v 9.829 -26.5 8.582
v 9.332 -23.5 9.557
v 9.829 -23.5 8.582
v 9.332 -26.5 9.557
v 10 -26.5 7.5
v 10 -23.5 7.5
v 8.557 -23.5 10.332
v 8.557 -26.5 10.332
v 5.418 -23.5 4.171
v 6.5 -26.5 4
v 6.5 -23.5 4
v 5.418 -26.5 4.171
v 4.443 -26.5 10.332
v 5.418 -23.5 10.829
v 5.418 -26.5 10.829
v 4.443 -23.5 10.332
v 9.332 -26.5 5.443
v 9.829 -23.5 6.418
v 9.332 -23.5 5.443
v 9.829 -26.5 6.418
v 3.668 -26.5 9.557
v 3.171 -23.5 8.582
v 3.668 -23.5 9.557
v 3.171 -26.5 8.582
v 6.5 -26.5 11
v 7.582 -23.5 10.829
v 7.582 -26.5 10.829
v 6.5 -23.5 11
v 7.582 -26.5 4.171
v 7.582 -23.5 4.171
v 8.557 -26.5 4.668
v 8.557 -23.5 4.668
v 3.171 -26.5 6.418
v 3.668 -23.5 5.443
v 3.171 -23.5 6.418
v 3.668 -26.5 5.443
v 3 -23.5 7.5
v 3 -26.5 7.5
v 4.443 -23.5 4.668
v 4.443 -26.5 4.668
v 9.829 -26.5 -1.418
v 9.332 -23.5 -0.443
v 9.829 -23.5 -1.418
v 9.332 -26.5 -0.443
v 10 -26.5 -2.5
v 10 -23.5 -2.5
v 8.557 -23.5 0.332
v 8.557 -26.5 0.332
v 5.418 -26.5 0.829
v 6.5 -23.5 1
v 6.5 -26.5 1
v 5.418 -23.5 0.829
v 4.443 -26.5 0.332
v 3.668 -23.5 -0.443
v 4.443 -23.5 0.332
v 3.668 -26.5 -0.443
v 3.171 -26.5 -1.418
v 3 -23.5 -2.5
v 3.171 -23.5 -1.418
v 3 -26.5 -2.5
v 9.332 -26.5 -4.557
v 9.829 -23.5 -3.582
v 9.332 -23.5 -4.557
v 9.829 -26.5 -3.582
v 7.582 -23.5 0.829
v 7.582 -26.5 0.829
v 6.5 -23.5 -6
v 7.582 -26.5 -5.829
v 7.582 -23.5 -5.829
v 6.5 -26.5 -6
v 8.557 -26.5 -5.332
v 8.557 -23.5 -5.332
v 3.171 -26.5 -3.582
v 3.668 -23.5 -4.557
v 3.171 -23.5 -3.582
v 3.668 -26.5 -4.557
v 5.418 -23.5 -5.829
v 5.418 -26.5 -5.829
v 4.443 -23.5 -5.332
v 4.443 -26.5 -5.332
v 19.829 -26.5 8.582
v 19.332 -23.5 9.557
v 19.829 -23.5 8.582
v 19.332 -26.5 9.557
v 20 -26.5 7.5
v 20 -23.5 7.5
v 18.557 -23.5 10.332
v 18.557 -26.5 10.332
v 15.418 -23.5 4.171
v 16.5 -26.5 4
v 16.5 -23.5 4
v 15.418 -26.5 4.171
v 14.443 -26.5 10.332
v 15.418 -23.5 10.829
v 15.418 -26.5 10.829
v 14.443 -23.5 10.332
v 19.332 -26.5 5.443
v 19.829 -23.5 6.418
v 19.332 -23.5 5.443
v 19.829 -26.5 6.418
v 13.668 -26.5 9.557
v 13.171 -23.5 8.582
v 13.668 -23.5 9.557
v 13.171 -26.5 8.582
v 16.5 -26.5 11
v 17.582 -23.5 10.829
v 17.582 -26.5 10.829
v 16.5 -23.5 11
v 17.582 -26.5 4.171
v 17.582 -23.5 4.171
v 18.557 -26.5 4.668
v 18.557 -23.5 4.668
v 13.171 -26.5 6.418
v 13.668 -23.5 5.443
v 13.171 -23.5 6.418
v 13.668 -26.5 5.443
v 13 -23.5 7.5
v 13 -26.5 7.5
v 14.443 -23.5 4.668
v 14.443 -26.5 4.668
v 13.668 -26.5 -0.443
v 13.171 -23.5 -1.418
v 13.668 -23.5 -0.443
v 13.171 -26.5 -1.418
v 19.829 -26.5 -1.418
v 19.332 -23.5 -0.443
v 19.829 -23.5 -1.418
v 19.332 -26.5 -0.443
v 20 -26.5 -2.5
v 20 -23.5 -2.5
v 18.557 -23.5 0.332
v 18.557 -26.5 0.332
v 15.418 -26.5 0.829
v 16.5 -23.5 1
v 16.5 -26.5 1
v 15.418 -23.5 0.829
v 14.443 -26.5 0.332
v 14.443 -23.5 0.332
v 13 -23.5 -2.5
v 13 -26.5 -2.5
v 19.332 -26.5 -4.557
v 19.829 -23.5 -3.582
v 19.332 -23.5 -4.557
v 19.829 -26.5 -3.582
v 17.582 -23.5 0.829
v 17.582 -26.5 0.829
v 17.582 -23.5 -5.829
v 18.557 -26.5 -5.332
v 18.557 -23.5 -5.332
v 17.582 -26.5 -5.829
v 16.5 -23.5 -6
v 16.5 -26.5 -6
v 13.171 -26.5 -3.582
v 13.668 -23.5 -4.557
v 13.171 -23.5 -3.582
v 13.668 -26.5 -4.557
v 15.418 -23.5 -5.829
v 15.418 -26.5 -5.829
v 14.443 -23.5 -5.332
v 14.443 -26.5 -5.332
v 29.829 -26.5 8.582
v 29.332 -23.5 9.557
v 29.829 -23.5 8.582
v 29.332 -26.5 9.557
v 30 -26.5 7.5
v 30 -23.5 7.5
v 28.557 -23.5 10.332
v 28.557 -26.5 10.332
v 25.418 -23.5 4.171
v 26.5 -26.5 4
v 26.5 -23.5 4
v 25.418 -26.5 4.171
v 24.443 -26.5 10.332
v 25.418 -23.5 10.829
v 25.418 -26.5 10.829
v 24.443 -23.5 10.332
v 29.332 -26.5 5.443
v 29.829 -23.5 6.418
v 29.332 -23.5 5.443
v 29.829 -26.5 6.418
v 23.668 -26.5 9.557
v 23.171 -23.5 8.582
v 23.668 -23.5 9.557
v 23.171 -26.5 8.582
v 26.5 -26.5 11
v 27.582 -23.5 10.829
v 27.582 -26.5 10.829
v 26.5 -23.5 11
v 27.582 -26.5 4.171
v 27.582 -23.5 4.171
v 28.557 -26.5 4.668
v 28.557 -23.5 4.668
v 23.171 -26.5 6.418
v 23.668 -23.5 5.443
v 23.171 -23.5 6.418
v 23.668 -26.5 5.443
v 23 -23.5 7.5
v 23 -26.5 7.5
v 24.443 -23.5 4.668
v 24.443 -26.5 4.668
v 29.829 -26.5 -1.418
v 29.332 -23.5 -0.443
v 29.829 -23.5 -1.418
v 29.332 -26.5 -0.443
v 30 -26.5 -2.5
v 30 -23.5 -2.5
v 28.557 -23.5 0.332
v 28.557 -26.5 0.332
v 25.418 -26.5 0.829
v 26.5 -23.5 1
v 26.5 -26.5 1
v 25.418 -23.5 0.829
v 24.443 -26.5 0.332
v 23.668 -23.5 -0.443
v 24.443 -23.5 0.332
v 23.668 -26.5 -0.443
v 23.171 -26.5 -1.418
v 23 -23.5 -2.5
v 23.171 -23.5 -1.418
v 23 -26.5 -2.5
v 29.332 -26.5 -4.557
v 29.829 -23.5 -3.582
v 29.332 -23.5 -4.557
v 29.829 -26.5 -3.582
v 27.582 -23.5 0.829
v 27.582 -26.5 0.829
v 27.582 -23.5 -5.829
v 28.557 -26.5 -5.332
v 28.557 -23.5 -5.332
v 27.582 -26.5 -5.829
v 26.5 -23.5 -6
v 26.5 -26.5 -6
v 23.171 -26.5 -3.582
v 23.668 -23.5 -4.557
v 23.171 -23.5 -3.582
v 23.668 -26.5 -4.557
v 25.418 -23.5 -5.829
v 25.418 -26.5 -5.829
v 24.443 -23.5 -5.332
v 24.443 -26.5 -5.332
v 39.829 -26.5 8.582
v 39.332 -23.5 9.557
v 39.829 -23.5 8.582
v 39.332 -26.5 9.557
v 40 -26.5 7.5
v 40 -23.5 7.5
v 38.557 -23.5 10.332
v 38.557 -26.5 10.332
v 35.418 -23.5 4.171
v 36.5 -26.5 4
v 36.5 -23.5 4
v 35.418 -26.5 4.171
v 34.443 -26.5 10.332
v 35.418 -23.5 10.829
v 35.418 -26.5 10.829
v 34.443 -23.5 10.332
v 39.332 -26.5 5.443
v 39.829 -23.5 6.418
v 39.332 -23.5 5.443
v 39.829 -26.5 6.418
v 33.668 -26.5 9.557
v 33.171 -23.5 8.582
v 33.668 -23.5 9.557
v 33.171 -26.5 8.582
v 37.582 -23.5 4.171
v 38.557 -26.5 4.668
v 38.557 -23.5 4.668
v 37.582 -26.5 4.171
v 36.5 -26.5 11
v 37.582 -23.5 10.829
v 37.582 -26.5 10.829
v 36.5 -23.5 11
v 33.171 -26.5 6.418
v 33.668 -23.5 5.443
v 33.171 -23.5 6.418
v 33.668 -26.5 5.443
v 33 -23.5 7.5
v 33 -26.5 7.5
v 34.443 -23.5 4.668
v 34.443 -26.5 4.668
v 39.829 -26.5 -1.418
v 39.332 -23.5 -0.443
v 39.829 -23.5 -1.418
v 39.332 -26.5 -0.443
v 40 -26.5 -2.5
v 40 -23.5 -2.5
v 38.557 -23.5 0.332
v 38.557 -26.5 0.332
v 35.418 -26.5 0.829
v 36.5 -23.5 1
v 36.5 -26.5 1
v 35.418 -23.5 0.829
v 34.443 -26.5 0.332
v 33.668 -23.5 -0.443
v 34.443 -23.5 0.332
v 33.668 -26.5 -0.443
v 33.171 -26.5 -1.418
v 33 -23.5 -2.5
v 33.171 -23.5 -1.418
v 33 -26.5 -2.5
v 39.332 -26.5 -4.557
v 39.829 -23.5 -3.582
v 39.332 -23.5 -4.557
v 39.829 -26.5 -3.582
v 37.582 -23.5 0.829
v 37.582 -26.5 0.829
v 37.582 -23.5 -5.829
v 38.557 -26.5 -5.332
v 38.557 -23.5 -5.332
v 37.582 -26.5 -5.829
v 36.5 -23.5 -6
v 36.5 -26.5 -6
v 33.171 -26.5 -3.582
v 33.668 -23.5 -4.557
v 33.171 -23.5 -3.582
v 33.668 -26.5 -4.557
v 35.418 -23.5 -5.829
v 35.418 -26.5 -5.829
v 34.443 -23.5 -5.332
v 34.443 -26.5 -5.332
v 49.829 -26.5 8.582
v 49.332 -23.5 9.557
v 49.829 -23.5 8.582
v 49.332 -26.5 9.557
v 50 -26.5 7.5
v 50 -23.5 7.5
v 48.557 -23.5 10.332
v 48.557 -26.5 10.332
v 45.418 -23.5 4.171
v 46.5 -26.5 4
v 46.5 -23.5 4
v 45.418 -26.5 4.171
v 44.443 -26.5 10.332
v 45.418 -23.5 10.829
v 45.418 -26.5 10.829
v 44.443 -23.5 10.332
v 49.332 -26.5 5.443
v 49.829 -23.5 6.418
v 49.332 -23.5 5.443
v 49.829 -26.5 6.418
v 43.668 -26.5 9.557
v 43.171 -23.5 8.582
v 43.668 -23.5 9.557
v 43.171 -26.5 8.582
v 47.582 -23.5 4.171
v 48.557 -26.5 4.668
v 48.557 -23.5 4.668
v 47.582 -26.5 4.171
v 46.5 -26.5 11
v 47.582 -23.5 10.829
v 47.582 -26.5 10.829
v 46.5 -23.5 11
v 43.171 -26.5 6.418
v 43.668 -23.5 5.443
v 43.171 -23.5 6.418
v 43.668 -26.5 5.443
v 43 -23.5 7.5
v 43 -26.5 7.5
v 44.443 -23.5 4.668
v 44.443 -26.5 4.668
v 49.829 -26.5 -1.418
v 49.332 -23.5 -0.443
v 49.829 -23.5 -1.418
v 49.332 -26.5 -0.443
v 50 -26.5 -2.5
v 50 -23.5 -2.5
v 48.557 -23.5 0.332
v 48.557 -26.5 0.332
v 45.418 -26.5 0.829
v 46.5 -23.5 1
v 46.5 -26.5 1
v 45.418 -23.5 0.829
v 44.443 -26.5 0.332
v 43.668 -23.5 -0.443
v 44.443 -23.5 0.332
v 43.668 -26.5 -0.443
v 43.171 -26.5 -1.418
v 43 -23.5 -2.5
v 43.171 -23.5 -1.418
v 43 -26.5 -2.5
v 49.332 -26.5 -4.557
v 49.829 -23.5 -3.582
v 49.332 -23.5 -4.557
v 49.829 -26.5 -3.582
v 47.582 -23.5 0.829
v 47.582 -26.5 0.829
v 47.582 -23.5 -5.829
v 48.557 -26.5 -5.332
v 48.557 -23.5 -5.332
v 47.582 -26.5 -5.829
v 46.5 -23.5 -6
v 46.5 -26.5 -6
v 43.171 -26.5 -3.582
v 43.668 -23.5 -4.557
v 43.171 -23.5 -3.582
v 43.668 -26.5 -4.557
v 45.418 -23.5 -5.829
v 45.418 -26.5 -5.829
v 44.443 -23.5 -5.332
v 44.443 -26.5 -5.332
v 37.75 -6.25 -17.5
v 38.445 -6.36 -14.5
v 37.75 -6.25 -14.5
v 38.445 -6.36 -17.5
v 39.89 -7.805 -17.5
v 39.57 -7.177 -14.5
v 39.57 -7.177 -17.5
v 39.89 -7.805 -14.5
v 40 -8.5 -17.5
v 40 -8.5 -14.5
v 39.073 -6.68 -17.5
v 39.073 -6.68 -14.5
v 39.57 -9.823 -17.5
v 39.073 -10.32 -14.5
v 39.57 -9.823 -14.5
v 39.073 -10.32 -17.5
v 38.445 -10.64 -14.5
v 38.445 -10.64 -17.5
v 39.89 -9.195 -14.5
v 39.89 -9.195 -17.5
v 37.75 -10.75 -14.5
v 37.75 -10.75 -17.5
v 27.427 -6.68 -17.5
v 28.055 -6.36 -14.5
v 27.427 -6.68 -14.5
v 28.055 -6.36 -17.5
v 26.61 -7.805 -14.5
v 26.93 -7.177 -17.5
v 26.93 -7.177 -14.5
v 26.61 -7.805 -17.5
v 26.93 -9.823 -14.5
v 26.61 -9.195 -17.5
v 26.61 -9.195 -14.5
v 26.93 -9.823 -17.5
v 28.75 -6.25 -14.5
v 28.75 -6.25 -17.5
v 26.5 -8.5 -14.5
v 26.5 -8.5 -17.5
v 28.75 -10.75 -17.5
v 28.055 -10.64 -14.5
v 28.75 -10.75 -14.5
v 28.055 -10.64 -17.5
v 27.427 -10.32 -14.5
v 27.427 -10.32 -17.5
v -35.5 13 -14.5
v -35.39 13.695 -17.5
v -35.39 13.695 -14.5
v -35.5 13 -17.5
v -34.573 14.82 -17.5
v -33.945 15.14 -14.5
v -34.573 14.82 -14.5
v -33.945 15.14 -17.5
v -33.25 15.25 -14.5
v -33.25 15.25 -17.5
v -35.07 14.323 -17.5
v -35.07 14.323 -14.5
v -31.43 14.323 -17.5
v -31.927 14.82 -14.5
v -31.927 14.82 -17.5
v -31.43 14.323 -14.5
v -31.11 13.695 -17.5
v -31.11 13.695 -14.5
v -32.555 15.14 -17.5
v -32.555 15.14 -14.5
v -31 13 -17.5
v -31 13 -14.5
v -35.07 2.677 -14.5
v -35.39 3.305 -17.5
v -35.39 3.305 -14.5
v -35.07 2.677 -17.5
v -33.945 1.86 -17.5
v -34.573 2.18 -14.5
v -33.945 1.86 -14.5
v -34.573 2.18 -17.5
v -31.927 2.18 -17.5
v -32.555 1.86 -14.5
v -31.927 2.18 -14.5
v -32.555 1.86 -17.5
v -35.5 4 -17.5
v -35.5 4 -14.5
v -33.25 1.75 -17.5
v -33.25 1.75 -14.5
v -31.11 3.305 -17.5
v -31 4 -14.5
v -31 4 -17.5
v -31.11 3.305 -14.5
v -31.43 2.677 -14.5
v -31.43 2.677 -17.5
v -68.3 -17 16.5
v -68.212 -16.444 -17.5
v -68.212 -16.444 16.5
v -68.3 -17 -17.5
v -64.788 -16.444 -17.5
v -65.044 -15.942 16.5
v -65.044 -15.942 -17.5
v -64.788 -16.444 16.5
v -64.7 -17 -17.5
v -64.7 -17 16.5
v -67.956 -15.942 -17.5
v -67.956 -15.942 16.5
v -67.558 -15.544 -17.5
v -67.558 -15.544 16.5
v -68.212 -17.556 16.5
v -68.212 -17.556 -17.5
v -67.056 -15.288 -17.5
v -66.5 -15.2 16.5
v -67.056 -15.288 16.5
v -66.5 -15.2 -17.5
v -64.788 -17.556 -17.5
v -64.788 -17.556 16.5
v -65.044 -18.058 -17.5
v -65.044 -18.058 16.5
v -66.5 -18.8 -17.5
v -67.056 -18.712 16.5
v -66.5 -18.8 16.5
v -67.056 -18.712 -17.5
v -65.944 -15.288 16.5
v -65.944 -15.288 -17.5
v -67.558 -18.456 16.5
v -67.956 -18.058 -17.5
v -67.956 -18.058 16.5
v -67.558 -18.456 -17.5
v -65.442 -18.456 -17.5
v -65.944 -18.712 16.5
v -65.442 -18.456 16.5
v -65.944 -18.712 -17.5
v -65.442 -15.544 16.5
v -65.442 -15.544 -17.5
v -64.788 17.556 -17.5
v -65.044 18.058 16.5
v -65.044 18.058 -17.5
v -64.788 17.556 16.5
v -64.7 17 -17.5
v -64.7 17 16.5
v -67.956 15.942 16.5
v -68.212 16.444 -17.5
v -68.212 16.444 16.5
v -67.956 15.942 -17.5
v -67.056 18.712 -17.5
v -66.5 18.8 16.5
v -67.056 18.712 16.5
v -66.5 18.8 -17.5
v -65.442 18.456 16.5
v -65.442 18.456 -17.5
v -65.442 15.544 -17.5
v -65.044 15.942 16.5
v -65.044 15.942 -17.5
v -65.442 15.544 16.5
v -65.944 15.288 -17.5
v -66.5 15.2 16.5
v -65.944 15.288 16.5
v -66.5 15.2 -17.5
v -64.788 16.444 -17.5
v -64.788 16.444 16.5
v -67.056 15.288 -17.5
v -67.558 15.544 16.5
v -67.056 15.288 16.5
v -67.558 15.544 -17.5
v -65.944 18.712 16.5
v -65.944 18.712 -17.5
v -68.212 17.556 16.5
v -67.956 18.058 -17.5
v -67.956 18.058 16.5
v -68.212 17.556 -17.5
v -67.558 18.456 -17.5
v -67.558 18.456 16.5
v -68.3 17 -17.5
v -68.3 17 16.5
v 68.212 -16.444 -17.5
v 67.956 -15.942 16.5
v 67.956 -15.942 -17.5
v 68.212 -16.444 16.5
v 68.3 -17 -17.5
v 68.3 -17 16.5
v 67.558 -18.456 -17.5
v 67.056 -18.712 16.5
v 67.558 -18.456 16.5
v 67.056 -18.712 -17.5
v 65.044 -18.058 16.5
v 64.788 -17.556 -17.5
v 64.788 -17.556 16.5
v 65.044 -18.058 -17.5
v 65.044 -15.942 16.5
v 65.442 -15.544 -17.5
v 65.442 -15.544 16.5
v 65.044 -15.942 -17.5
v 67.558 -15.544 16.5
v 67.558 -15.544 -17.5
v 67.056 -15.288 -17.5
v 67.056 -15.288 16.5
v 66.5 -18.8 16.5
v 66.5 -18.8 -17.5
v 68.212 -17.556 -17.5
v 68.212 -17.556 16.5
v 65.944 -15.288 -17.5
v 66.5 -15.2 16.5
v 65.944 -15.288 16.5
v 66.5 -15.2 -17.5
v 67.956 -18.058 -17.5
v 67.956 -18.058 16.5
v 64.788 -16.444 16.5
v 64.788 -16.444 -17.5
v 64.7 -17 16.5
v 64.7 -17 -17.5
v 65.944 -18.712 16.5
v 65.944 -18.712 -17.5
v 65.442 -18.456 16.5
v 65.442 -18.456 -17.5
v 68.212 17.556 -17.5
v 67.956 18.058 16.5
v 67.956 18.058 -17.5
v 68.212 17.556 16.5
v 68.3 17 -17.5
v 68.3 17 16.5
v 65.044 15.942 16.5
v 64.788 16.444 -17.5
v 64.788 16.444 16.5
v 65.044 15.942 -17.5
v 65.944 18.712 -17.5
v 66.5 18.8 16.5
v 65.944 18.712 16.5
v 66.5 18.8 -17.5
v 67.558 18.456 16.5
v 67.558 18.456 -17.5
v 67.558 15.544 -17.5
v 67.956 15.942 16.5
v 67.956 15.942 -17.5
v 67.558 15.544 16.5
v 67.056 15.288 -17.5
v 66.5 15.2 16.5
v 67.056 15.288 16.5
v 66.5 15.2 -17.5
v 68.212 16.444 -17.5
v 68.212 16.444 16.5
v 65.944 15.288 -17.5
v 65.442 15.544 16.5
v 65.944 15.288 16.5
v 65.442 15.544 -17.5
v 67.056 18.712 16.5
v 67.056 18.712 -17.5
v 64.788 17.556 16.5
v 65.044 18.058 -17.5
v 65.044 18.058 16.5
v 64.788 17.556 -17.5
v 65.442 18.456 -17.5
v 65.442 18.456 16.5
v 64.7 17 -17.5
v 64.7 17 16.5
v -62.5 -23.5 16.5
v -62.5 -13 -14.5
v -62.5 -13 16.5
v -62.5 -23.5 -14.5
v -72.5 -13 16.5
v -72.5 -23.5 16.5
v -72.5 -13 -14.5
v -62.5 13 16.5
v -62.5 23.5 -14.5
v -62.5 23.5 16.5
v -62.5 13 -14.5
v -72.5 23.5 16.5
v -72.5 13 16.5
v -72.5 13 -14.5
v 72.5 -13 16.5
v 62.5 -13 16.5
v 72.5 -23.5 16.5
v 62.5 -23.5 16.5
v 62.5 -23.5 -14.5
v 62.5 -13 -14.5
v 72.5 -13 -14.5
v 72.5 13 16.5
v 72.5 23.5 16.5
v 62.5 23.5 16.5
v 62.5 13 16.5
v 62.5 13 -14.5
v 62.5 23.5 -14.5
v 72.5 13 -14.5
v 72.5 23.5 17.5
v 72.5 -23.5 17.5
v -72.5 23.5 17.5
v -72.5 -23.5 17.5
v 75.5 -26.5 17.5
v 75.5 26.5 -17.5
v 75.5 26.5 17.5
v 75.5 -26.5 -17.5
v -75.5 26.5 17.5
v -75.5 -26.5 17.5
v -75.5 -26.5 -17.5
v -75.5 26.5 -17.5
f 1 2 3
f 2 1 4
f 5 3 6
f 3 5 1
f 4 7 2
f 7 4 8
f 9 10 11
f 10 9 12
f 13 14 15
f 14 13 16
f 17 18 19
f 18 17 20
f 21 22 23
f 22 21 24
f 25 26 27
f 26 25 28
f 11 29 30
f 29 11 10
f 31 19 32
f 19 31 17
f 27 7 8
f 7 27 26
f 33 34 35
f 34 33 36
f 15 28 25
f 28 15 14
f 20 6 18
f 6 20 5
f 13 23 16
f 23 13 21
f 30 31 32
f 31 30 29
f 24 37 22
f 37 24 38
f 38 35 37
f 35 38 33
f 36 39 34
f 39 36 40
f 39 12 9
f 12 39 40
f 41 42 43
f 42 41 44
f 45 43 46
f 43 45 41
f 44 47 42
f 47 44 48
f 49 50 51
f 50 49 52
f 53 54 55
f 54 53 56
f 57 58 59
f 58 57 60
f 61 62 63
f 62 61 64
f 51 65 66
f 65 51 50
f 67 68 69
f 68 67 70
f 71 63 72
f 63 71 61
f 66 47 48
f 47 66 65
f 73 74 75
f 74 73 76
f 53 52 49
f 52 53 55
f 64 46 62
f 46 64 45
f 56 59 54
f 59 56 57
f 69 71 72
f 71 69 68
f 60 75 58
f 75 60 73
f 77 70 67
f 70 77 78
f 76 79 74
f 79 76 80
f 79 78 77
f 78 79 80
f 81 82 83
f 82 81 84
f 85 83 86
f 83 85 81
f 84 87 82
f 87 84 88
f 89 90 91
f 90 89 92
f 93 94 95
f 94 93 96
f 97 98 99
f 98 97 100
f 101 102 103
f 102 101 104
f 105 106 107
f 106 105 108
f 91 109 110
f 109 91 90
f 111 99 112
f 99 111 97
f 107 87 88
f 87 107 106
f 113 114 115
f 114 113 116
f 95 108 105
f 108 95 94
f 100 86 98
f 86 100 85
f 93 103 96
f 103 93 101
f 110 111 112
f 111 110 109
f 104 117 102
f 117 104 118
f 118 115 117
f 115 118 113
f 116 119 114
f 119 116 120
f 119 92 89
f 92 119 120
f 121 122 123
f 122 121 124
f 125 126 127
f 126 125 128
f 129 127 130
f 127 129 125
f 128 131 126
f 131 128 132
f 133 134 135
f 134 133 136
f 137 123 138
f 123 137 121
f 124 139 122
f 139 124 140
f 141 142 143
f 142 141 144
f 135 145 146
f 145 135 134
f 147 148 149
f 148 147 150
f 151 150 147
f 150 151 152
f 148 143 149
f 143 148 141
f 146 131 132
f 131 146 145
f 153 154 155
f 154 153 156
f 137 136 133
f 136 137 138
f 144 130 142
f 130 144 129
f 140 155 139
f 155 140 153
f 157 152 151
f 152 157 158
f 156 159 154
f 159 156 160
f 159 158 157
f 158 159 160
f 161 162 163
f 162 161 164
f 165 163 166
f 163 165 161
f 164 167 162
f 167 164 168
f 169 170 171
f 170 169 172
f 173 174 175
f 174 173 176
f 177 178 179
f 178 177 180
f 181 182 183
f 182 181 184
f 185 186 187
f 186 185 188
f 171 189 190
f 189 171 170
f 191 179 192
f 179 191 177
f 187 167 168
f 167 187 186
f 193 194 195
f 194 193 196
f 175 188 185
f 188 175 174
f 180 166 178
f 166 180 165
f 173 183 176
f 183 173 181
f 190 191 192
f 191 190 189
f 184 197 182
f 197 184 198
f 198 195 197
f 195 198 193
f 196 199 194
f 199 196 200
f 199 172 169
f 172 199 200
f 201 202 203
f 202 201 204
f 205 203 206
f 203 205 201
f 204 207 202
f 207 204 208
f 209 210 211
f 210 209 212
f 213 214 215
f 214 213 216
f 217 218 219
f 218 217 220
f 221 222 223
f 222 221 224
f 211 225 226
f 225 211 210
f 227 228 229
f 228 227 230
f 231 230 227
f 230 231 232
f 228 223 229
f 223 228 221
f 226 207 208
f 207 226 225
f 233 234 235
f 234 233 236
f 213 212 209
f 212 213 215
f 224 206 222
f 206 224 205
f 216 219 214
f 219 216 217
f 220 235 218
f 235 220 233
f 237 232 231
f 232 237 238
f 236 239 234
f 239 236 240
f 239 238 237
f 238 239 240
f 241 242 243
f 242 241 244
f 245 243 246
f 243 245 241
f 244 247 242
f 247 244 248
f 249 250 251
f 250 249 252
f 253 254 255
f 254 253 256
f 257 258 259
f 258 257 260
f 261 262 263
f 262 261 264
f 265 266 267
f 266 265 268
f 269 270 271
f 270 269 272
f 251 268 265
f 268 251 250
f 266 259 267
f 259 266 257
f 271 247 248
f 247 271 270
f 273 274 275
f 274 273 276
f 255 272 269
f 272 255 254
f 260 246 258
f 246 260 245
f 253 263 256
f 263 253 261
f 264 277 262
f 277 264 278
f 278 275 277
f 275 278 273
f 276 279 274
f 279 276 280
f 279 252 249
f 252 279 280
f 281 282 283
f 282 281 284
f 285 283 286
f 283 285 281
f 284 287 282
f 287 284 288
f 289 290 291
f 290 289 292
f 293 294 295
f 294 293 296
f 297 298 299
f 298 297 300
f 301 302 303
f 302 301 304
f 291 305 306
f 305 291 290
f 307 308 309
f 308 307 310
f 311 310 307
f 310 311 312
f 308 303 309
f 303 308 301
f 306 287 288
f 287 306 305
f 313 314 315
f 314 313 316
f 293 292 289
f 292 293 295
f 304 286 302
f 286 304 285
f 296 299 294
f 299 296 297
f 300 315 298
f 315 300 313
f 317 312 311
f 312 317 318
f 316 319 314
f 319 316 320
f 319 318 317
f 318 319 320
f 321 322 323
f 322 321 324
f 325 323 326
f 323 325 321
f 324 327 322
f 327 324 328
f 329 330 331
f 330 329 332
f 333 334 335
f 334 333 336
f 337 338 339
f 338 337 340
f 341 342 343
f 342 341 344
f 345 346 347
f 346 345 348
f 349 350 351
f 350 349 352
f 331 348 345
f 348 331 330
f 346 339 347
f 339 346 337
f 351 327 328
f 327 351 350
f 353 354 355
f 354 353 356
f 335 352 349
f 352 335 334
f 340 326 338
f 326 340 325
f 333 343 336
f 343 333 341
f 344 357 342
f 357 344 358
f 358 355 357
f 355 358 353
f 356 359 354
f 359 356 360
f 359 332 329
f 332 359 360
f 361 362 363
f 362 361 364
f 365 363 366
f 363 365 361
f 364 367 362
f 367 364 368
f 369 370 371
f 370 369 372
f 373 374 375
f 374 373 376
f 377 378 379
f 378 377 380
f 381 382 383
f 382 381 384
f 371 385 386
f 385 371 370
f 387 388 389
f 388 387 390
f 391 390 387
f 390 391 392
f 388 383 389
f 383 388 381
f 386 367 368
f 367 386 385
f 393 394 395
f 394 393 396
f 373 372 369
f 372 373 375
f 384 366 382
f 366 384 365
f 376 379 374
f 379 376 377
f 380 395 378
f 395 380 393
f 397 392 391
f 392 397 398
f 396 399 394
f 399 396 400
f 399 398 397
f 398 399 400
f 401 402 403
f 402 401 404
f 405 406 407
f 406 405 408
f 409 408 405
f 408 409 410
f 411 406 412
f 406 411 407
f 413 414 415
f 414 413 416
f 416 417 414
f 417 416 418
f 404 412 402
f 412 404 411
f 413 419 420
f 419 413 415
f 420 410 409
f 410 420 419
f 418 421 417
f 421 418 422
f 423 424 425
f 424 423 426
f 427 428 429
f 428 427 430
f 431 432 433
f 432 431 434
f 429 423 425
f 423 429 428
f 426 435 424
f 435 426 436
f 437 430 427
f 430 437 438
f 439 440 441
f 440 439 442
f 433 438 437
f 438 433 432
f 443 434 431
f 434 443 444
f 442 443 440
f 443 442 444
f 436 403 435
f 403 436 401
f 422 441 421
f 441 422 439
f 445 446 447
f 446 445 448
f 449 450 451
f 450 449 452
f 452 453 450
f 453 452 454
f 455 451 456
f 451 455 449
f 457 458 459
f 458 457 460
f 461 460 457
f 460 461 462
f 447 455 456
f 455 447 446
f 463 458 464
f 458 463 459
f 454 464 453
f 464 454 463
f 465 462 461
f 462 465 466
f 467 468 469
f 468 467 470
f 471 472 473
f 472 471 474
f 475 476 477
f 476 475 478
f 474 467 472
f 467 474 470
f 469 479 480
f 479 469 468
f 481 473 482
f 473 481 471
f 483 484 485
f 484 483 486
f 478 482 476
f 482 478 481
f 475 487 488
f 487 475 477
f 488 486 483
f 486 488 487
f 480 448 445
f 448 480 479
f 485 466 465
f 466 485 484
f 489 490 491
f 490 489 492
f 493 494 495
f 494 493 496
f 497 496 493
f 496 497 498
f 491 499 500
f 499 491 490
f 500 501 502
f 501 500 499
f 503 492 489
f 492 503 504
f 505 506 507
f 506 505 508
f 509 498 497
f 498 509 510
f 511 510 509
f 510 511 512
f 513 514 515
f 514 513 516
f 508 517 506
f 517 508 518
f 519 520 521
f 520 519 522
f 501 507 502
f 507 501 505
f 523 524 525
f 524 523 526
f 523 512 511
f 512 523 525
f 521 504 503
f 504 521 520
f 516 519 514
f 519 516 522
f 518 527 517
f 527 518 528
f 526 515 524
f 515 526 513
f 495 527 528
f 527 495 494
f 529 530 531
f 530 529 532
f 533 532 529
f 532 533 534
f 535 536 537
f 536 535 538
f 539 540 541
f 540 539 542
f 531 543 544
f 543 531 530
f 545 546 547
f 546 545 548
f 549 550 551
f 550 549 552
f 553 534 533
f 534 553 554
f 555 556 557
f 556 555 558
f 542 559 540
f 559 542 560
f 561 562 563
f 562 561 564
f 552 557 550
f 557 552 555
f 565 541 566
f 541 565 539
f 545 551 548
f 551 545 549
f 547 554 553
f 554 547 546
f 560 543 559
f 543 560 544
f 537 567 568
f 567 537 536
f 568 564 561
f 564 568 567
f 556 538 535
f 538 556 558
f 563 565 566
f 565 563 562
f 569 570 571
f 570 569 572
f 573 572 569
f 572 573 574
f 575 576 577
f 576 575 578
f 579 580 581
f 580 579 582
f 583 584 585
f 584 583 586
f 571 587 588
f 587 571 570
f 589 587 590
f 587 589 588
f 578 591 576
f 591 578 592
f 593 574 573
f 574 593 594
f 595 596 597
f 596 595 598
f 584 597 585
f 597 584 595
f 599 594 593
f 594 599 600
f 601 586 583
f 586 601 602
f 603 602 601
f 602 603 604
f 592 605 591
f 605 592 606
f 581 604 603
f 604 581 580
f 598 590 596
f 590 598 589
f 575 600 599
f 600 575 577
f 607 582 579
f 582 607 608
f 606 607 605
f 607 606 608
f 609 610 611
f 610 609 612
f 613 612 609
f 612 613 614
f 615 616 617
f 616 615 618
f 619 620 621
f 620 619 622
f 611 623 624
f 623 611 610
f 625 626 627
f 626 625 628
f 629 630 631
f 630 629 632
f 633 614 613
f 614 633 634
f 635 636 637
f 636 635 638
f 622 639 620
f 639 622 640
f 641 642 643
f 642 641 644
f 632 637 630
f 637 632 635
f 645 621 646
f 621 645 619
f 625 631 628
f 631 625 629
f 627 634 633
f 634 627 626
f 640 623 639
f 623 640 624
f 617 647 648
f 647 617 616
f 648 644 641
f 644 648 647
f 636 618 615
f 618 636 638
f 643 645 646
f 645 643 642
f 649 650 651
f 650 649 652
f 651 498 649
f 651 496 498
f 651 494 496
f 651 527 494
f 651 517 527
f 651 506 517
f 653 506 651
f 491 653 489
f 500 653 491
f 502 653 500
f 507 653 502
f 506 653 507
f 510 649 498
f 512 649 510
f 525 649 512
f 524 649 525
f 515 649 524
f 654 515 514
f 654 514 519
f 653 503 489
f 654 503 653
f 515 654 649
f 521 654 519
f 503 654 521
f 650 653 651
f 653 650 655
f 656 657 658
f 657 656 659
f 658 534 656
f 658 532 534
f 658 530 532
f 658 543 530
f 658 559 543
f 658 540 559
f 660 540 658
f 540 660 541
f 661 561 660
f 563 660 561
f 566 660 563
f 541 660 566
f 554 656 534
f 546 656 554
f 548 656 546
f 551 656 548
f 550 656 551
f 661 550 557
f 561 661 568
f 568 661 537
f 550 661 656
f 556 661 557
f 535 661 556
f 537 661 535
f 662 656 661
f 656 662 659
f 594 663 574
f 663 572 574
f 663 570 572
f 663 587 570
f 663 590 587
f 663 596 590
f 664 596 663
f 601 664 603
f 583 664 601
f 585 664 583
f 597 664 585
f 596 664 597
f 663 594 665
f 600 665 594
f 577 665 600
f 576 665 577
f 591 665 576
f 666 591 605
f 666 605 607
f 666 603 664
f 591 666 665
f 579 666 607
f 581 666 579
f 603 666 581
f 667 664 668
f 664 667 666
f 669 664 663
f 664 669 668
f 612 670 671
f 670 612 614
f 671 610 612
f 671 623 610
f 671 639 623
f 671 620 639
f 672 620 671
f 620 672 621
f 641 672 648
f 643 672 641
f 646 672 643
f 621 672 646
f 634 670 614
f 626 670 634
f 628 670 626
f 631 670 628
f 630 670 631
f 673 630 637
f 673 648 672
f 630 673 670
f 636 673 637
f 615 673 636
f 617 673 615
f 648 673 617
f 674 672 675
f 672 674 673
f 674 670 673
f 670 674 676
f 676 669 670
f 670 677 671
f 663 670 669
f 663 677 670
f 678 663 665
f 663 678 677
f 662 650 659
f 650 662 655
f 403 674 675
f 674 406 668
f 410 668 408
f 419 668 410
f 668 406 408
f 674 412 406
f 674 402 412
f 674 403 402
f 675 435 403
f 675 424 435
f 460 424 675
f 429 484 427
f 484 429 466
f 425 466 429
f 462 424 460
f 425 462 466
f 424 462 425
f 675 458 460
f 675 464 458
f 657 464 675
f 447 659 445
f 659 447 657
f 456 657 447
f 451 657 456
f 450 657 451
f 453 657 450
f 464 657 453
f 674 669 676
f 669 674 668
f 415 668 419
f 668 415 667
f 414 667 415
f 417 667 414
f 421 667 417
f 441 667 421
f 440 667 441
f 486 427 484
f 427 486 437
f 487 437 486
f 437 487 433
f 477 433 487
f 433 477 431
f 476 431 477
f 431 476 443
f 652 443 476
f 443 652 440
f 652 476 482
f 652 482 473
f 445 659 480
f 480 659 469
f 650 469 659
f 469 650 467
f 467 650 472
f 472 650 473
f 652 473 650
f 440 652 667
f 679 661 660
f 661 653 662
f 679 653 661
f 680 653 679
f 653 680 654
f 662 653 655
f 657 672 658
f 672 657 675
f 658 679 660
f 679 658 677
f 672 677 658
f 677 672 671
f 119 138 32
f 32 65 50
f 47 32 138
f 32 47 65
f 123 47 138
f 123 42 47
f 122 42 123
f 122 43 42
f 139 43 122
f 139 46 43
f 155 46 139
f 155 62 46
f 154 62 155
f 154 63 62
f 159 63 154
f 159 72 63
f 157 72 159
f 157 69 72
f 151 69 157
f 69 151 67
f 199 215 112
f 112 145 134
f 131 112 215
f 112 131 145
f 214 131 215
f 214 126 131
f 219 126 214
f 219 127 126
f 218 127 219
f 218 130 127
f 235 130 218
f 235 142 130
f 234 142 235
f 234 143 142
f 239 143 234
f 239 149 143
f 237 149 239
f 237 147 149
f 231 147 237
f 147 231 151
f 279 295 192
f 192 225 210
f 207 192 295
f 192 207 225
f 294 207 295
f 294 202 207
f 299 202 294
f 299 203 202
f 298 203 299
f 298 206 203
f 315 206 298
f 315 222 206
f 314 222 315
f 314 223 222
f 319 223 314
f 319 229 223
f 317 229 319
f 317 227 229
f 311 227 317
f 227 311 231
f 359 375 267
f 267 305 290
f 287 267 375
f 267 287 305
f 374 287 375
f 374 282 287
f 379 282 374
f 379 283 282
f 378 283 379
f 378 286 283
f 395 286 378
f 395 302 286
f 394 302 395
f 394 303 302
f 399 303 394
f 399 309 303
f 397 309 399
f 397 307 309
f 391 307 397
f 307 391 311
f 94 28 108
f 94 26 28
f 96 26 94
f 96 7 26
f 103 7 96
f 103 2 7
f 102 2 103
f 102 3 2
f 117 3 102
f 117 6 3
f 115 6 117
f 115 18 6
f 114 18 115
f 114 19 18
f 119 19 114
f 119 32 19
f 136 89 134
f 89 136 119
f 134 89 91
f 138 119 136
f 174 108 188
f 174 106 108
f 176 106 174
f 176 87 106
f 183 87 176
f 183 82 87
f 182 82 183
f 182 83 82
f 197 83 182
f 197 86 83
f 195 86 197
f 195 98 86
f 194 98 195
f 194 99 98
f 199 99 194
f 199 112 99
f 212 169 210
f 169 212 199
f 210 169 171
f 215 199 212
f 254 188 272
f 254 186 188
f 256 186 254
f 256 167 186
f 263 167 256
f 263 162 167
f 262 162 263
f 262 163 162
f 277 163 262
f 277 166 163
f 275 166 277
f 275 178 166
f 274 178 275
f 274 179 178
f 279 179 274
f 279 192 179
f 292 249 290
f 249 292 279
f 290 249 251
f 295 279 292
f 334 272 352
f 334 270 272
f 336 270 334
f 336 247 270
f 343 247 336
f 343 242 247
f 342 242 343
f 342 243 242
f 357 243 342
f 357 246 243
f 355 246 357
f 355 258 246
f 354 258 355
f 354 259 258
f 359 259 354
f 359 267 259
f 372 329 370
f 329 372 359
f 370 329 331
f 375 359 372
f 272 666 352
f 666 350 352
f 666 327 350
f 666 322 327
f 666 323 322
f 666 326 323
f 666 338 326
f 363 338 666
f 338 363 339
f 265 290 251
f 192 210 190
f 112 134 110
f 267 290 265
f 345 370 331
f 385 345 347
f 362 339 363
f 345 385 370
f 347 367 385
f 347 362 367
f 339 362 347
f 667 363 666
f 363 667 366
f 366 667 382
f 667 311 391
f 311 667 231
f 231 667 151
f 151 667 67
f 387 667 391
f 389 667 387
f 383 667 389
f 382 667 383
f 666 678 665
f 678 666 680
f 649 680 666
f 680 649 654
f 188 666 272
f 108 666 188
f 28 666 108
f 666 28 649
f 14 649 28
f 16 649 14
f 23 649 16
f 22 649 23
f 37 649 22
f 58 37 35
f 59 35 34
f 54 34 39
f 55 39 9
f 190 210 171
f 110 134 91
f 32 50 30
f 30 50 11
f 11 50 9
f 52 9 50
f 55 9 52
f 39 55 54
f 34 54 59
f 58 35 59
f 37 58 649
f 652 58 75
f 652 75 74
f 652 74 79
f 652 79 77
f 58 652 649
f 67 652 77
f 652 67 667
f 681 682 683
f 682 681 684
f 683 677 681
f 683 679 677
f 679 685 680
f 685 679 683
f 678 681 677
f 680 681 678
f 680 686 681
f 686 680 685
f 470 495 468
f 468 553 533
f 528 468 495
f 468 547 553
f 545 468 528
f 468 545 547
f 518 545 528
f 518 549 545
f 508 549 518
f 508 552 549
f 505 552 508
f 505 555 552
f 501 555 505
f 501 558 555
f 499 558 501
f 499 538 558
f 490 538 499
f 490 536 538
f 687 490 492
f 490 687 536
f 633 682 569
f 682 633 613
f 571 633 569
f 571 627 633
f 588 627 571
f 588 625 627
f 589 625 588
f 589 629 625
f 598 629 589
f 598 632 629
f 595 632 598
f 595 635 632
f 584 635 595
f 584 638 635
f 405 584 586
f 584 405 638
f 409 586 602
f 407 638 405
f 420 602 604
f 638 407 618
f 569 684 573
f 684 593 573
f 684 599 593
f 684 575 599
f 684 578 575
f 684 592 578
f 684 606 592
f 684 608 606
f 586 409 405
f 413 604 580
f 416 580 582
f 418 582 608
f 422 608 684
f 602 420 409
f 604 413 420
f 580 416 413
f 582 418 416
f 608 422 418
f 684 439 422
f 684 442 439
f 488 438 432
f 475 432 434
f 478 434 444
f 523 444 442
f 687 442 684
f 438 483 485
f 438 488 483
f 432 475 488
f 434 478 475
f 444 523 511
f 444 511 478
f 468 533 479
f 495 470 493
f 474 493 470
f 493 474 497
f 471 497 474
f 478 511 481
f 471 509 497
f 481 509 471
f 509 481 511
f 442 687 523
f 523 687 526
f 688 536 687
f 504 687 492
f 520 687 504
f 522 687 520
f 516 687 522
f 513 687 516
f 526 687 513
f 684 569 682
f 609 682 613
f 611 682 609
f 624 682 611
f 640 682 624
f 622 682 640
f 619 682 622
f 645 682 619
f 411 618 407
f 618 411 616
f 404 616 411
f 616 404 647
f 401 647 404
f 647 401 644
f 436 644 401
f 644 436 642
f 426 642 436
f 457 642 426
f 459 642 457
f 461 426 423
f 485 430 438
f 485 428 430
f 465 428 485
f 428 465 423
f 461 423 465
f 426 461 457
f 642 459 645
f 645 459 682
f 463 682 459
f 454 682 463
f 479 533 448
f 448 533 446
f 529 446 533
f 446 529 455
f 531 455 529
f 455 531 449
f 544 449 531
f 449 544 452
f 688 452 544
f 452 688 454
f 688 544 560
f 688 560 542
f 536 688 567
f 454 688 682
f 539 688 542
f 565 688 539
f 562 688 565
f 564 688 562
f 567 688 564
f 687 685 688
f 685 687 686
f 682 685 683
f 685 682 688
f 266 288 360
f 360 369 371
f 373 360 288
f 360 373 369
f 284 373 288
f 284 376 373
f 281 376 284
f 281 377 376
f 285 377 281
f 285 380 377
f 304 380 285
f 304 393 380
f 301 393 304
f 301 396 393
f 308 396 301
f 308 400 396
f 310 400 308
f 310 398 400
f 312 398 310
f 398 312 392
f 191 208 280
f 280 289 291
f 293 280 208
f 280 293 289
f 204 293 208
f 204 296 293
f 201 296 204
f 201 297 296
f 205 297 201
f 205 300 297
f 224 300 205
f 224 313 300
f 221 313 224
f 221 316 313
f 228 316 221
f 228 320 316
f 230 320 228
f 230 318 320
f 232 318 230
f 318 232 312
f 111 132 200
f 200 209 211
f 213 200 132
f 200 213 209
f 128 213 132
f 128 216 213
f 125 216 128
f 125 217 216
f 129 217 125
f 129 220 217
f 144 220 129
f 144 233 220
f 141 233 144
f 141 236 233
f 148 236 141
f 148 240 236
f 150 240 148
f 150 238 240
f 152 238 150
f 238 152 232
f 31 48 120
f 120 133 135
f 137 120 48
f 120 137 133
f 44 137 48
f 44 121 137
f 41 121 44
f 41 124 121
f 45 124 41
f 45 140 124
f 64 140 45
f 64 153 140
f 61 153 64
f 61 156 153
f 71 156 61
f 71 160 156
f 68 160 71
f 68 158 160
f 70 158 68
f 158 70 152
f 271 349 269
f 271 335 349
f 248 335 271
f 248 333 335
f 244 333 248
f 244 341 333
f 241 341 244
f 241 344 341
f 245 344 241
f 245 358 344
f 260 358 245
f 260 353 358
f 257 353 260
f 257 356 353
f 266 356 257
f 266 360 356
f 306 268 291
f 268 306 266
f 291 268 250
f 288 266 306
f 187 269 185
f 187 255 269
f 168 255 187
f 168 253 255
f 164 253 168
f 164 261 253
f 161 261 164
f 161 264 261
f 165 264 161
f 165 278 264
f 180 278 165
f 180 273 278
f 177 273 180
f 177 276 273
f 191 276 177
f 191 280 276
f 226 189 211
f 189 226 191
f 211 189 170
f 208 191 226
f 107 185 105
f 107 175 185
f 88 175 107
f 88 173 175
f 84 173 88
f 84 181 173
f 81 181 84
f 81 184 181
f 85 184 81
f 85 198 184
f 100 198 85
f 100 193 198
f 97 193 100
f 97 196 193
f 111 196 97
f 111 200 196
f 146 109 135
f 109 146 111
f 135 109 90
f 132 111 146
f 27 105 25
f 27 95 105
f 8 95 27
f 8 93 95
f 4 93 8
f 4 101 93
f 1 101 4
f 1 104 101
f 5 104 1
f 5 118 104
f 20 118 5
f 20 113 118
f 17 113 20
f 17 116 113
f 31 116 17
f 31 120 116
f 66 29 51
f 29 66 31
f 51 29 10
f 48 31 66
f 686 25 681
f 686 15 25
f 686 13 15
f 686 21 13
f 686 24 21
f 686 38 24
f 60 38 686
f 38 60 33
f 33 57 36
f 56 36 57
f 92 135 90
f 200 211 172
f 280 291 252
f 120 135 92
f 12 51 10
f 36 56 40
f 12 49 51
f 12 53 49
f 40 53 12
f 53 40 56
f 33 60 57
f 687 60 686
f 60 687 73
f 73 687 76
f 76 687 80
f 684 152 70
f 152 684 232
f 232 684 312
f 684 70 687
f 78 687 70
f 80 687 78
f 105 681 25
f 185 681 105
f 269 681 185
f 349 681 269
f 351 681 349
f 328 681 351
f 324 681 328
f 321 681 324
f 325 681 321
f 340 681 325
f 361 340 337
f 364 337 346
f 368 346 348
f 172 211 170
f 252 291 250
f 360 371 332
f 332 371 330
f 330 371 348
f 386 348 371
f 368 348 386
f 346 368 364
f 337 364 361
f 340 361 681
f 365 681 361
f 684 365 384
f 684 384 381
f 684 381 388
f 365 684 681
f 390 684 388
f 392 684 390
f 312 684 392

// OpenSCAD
//cubex=120; //71;
//cubey=130; //73;
cubex=125+26;
cubey=53;
xcen = cubex - 18;
ycen = cubey - 19;
dia = 4.5;
thick=35;
lid=false;
ribbonNotch=true;
//offx=cubex/2-71/2;
//offy=cubey/2-73/2;
offx = 0;
offy=0;

case();



module slot()
{
	translate([dia,0,0])
		cylinder(r=dia/2,h=60, center=true,$fn=20);
	translate([-dia,0,0])
		cylinder(r=dia/2,h=60, center=true,$fn=20);
	cube([2*dia,dia,60],center=true);	
}

module corner(box, rr)
{
	translate([offx, offy, 0])
	{
	for(x=[-1,1])for(y=[-1,1])
		translate([x*xcen/2,y*ycen/2,0])
		{
			if(box)
			{
				translate([2*x,2*y,-1])
					cube([12,12,thick], center=true);
			} else
			{
				cylinder(r=rr, h=40, center=true, $fn=20);
				if(lid)
				{
				translate([0,0,-thick/4-0.8])
				cylinder(r1=2.3*rr, r2=rr, h=2.5, center=true, $fn=20);
				}
			}
		}
}
}

module case()
{

difference()
{
	translate([offx, offy, 0])
		cube([cubex,cubey,thick], center=true);


	if(lid)
	{
		/*translate([-xcen/2,ycen/2,0])
		{
			translate([9,-2,0])
				cylinder(r=1.7, h=40, center=true, $fn=20);
			translate([9+6.5,-2,0])
			cylinder(r=1.7, h=40, center=true, $fn=20);
			translate([9+6.5+6.3,-2,0])
			cylinder(r=1.7, h=40, center=true, $fn=20);
		}
		translate([20-xcen/2,-ycen/2-3,0])
		{
			translate([-2,0,0])
					cylinder(r=1, h=40, center=true, $fn=20);
			translate([2,0,0])
			cylinder(r=1, h=40, center=true, $fn=20);
		}*/
		corner(box=false, rr=dia/2);
		if(ribbonNotch)
		{
			translate([-xcen/2-5,ycen/2-16,7.5])
				cube([10,17,10], center=true);
		}
	} else
	{
		for(x=[0:4])
		translate([xcen/2,-ycen/2,12.5-1-4])
		{
			translate([-60+x*10,-2,0])
				rotate([90,0,0])
					cylinder(r=3.5, h=40, center=true, $fn=20);

			translate([-60+x*10,-2,-10])
				rotate([90,0,0])
					cylinder(r=3.5, h=40, center=true, $fn=20);

		
		}

		/*translate([-xcen/2,ycen/2,12.5-14])
					translate([30-10,-2,0])
				rotate([90,0,0])
					cylinder(r=1, h=40, center=true, $fn=20);
		*/
		translate([xcen/4,-ycen/4,0])
			slot();
		translate([-xcen/4,ycen/4,0])
			rotate([0,0,90])
				slot();
		corner(box=false, rr=0.8*dia/2);
	}


translate([offx, offy, 0])
	difference()
	{
		translate([0,0,3])
		cube([cubex-6,cubey-6,thick], center=true, r=dia/2);
		corner(box=true, rr=dia/2);
	}

}

}
